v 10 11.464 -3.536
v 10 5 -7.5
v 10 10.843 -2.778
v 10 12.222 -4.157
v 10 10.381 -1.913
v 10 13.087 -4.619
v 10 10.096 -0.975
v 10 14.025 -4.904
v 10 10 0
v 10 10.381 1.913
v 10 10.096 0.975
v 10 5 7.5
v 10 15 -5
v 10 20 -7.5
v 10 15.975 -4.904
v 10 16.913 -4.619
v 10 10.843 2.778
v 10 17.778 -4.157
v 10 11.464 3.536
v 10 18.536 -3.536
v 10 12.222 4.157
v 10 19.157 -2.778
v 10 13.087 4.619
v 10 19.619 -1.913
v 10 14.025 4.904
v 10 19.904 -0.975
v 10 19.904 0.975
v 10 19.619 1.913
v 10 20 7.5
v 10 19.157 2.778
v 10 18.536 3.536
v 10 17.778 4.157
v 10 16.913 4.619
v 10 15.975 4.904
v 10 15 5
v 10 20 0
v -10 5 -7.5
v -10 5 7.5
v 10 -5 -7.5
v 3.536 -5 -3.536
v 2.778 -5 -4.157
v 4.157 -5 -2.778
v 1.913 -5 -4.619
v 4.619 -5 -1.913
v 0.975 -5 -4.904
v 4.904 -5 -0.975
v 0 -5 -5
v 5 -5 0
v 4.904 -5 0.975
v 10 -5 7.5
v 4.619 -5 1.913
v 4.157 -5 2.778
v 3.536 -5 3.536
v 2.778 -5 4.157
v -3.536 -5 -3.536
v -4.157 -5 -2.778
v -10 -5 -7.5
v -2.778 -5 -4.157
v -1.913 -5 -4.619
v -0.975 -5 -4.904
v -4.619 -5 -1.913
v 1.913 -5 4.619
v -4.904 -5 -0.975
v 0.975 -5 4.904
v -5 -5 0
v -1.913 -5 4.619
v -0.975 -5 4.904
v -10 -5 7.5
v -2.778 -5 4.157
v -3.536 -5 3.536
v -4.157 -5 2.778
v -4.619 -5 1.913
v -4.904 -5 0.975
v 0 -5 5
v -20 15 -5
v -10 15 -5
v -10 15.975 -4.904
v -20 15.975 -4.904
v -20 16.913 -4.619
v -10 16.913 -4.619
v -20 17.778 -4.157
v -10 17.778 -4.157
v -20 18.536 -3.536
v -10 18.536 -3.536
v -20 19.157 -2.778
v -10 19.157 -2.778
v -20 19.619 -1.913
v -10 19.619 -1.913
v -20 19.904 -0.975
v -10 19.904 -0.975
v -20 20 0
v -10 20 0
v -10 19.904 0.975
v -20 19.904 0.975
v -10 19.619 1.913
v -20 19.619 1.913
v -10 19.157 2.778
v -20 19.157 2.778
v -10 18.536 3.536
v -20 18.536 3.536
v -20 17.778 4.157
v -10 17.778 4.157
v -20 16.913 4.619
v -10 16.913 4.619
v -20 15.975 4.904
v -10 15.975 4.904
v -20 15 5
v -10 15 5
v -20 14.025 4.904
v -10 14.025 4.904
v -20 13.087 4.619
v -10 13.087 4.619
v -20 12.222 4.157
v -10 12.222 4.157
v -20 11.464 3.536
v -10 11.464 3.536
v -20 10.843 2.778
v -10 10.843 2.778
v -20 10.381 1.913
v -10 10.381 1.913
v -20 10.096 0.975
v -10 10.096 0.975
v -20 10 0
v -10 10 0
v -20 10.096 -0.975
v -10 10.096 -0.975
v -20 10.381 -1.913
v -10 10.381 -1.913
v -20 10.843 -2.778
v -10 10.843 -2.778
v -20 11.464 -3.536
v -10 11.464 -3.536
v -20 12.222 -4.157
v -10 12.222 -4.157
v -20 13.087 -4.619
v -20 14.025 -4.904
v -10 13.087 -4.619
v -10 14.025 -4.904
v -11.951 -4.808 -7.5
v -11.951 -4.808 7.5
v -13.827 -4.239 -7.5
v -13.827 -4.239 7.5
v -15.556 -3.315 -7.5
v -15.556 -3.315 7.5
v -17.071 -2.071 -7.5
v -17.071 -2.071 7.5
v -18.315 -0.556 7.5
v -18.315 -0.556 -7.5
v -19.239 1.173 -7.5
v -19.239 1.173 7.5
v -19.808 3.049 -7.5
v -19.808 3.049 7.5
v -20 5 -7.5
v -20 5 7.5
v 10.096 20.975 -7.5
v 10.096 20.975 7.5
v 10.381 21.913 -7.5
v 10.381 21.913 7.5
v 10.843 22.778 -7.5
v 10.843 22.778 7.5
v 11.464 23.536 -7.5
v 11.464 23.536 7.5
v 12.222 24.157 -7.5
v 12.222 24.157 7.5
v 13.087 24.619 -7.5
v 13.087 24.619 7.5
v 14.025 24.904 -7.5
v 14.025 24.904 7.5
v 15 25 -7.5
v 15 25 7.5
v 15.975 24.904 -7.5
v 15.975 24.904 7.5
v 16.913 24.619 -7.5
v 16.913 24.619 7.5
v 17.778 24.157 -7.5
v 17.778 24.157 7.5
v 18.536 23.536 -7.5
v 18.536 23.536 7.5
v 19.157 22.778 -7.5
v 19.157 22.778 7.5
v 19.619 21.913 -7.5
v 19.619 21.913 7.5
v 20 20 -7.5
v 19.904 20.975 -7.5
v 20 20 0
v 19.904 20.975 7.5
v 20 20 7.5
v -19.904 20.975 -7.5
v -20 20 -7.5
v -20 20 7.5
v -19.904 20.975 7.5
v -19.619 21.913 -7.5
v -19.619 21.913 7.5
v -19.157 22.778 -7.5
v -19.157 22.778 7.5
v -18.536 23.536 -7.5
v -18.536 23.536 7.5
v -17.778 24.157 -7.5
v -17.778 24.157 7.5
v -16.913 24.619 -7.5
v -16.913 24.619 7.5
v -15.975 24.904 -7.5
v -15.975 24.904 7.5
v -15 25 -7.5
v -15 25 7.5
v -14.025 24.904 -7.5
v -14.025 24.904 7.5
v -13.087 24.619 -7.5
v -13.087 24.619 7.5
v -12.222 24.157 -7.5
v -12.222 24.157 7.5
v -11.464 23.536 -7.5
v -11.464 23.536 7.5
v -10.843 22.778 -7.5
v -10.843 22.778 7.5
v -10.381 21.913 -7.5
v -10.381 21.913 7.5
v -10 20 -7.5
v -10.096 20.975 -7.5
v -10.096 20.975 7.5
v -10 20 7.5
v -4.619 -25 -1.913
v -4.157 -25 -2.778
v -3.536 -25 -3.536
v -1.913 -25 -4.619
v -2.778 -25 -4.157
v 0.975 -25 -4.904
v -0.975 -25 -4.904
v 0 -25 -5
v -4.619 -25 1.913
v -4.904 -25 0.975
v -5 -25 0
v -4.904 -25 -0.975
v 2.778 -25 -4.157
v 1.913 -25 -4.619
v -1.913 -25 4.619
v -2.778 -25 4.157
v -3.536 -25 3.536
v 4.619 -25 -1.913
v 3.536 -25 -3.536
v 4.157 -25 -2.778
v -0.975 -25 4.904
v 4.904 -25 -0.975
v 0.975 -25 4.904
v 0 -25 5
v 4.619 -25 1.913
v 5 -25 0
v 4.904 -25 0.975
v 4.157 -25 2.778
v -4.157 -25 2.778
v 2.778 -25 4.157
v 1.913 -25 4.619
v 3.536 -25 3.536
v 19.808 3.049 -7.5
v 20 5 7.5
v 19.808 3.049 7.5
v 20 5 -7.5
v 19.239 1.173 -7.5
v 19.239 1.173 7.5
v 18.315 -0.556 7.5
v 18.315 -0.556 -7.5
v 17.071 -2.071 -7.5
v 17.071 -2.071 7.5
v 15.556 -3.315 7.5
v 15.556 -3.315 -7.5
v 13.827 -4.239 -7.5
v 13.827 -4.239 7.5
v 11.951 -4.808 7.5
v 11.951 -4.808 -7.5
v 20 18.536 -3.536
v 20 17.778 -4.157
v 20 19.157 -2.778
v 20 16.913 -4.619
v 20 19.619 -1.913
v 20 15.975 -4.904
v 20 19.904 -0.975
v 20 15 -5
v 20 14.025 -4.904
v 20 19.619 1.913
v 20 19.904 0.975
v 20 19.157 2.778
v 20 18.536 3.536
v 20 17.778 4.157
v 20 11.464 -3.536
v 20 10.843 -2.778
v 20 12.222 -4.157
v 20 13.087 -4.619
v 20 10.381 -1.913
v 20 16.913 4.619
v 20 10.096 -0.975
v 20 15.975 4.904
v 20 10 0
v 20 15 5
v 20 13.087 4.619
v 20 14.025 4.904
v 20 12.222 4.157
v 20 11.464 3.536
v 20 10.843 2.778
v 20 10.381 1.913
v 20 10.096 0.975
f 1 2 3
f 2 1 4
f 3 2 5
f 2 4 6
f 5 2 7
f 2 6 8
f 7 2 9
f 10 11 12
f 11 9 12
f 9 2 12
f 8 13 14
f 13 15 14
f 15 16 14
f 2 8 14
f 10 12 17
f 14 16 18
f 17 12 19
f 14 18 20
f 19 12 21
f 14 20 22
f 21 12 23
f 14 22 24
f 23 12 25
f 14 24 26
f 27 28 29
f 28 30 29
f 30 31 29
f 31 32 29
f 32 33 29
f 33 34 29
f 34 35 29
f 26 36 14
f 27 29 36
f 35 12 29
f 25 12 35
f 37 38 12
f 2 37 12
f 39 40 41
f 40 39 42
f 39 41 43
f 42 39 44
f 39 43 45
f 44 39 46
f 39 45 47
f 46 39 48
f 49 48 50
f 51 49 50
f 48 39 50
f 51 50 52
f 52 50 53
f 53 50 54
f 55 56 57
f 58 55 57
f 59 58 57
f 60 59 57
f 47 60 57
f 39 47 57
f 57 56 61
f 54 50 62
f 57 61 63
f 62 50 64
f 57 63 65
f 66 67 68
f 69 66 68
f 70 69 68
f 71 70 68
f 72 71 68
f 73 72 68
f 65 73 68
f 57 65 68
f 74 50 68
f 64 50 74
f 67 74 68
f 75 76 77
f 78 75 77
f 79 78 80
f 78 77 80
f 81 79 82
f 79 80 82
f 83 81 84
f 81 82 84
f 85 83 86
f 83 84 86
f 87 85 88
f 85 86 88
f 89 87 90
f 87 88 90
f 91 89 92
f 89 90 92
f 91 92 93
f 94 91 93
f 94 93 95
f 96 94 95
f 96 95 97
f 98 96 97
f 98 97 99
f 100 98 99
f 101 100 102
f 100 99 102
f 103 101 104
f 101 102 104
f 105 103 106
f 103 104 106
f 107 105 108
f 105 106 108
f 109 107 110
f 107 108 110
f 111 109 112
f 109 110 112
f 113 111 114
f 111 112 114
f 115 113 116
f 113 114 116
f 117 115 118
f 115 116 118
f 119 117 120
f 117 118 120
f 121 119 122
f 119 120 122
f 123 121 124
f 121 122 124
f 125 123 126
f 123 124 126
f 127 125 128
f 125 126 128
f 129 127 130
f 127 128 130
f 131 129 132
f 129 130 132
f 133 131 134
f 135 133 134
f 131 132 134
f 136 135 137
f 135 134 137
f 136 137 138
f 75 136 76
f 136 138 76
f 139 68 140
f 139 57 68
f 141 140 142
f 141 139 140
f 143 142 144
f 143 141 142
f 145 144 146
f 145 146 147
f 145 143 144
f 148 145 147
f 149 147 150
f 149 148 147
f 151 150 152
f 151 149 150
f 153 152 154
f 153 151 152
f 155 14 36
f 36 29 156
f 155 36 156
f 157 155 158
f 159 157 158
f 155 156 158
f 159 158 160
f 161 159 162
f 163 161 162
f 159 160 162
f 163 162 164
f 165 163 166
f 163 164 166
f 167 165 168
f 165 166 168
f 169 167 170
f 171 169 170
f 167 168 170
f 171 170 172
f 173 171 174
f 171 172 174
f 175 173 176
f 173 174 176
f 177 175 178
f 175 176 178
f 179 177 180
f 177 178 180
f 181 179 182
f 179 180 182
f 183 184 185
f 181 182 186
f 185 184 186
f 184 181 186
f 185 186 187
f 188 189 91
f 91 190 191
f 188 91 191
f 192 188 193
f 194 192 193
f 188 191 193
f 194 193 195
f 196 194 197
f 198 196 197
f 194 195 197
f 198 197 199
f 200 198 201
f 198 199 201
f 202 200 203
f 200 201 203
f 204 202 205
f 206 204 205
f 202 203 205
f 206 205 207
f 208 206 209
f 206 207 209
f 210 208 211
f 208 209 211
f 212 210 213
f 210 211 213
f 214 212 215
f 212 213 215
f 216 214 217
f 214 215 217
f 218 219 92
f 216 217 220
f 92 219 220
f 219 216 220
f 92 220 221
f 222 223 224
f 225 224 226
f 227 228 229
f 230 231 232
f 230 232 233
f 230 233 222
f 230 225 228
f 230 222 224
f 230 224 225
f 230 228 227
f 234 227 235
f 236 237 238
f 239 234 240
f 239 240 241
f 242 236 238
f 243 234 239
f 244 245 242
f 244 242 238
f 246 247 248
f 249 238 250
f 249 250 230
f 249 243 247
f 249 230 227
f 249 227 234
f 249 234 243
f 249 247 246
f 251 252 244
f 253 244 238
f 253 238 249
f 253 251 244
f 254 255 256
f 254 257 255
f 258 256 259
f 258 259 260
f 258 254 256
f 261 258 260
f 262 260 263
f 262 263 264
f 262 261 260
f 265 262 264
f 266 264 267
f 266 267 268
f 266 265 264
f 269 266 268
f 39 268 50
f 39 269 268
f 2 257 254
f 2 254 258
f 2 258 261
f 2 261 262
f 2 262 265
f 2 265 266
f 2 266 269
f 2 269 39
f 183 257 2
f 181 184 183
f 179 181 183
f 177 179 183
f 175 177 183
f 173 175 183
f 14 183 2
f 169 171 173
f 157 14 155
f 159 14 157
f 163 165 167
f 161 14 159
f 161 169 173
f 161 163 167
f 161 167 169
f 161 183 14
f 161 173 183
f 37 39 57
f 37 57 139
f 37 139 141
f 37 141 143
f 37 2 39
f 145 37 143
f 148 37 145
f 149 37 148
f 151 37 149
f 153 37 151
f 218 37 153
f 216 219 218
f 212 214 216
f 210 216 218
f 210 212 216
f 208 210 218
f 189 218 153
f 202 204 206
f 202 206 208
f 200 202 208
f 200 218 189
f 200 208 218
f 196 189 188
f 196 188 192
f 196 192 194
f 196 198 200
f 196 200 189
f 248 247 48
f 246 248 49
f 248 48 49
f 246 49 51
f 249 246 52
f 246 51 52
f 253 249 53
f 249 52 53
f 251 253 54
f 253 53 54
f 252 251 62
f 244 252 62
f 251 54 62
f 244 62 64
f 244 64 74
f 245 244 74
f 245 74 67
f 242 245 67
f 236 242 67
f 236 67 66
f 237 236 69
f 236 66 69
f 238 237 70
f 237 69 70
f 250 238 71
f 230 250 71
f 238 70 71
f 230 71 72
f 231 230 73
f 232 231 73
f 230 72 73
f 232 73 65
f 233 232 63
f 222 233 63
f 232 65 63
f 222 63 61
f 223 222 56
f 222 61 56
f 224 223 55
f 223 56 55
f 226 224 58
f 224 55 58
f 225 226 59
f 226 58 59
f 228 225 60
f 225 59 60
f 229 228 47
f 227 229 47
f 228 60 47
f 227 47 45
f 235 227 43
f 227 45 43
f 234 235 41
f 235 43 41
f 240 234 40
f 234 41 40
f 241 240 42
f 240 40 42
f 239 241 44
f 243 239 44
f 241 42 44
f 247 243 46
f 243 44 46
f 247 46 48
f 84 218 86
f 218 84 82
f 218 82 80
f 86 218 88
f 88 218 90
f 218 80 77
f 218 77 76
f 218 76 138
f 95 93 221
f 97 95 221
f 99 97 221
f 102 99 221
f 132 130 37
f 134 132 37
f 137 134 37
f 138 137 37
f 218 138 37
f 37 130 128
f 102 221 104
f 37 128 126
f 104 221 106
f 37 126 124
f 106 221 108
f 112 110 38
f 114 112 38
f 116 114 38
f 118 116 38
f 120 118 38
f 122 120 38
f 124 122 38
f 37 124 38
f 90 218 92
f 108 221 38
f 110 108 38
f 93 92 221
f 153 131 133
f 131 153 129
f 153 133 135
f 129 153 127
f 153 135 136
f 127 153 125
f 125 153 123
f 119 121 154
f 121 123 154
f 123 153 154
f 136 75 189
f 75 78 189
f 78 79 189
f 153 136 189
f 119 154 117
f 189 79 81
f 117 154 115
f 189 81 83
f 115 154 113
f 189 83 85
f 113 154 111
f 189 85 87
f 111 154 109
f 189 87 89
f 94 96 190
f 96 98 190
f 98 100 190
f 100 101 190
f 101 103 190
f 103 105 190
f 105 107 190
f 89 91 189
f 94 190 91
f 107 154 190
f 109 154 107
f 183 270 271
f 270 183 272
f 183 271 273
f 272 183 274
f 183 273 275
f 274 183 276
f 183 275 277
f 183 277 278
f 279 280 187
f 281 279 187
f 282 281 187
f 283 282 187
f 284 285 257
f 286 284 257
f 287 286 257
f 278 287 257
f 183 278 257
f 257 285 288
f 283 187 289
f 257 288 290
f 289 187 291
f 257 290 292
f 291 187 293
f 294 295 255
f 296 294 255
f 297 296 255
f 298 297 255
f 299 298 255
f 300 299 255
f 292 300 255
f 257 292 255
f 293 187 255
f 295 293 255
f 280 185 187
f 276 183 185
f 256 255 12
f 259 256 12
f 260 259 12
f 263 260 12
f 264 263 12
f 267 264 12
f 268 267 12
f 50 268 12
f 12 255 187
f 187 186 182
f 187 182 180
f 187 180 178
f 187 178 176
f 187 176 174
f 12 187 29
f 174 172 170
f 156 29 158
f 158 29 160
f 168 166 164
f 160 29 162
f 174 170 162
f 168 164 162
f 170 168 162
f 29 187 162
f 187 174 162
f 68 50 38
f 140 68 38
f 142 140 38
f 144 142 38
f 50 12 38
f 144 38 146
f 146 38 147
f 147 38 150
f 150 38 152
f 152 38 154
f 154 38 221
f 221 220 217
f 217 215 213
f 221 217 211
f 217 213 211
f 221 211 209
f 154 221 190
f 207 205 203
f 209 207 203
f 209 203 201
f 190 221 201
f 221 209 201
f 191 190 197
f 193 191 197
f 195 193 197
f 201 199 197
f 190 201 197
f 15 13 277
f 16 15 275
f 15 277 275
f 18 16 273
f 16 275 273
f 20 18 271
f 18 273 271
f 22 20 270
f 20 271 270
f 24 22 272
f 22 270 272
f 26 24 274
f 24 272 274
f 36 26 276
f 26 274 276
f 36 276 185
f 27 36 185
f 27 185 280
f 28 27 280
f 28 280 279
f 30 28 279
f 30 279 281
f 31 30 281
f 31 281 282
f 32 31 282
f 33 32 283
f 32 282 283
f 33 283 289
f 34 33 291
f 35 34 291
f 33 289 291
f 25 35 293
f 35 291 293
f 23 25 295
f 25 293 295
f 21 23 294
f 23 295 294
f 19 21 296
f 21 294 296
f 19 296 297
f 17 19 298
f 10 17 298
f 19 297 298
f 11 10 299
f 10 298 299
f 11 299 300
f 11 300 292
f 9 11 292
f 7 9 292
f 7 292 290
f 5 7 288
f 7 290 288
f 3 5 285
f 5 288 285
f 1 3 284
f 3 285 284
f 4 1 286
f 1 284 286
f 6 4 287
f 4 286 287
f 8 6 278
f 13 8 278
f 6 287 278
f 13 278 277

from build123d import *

# Parameters (mm, degrees)
BOSS_EXTRUDE1_DEPTH = 7.5
SKETCH3_R           = 5
BOSS_EXTRUDE2_DEPTH = 20
FILLET1_R           = 10
SKETCH2_R           = 5
CUT_EXTRUDE1_DEPTH  = 40


with BuildPart() as part:
    # Sketch1 → Boss-Extrude1 (new body, symmetric)
    with BuildSketch(Plane.XY):
        with BuildLine():
            Line((10, 5), (10, 20))
            ThreePointArc((10, 20), (15, 25), (20, 20))
            Line((20, 20), (20, -5))
            Line((20, -5), (-20, -5))
            Line((-20, -5), (-20, 20))
            ThreePointArc((-20, 20), (-15, 25), (-10, 20))
            Line((-10, 20), (-10, 5))
            Line((-10, 5), (10, 5))
        make_face()
    extrude(amount=BOSS_EXTRUDE1_DEPTH, both=True)

    # Sketch3 → Boss-Extrude2 (add)
    with BuildSketch(Plane.XZ.offset(5)):
        Circle(SKETCH3_R)
    extrude(amount=BOSS_EXTRUDE2_DEPTH)

    # Fillet1
    fillet1_edges = [part.edges().sort_by_distance(p)[0] for p in [
        (20, -5, 0),
        (-20, -5, 0),
    ]]
    fillet(fillet1_edges, radius=FILLET1_R)

    # Sketch2 → Cut-Extrude1 (cut)
    with BuildSketch(Plane(origin=(20, 0, 0), x_dir=(0, 0, -1), z_dir=(1, 0, 0))):
        with Locations((0, 15)):
            Circle(SKETCH2_R)
    extrude(amount=-CUT_EXTRUDE1_DEPTH, mode=Mode.SUBTRACT)


solid = part.part
